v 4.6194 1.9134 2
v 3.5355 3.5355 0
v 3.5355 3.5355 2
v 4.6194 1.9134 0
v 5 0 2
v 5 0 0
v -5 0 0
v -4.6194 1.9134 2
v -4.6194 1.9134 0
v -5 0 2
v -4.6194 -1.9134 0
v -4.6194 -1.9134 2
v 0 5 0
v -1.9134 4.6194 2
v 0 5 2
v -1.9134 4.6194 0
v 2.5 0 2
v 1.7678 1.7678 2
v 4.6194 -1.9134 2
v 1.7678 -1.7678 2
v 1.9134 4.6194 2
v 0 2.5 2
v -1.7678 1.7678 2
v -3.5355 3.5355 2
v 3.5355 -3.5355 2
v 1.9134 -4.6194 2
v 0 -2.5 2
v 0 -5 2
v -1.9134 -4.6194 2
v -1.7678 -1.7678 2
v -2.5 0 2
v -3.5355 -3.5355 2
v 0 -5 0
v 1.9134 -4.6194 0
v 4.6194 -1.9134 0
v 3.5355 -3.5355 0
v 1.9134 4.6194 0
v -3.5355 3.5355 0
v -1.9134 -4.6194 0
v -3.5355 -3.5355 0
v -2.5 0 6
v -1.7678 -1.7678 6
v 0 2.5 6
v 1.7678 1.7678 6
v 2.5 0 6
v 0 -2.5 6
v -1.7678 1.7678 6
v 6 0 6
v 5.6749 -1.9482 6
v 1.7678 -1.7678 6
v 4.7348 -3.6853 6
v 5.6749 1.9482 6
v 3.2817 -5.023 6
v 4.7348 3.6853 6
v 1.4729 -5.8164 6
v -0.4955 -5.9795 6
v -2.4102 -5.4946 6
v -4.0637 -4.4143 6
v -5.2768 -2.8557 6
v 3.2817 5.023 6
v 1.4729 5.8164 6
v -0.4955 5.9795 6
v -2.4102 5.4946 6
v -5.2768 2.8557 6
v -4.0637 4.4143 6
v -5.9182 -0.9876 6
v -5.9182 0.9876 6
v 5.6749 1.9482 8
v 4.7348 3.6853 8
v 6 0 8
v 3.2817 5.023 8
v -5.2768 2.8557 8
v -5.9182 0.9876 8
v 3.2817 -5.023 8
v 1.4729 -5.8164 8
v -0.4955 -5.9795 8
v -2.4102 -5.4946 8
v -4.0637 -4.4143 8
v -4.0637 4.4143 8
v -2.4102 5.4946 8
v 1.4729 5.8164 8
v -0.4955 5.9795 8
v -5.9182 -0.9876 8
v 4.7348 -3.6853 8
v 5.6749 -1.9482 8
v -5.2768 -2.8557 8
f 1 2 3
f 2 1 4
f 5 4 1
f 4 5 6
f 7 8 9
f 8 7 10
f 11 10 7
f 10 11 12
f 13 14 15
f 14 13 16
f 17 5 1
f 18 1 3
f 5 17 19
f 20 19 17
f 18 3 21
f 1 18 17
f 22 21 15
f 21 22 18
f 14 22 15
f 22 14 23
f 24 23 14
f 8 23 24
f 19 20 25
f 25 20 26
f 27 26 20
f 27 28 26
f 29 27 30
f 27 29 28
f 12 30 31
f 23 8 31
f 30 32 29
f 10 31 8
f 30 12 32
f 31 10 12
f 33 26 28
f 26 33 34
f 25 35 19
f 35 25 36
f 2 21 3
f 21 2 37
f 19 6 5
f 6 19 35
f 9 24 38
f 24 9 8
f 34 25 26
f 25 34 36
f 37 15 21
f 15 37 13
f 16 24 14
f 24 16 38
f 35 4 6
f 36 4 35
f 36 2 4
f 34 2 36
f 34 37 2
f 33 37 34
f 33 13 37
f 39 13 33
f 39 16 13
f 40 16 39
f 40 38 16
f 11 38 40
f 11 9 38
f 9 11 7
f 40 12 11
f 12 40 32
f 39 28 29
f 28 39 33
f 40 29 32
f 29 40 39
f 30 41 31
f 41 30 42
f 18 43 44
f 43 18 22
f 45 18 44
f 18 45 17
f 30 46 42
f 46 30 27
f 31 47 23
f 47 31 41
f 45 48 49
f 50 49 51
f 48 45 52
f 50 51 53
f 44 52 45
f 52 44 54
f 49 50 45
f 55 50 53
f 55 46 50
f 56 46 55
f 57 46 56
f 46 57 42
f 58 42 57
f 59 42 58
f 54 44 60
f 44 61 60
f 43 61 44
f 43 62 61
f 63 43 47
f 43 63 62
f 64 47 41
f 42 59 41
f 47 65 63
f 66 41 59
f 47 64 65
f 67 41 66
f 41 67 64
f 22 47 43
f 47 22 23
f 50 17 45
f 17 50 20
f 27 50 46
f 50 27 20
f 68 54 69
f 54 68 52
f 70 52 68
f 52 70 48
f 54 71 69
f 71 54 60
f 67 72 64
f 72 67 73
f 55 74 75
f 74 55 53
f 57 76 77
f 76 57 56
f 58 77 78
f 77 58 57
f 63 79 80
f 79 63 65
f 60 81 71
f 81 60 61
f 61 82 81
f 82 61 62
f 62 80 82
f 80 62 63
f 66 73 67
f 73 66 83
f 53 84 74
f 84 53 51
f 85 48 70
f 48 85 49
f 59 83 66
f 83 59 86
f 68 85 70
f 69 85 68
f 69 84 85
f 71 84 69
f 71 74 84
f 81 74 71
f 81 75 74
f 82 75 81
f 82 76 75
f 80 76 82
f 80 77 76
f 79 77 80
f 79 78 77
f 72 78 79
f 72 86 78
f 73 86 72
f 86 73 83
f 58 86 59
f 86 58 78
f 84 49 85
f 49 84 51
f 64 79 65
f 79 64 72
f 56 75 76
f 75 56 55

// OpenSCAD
//Buttons to hold internal diffuser inside the softbox
translate([0,0,0])cylinder(d=10,h=2);
translate([0,0,2])cylinder(d=5,h=4);
translate([0,0,6])cylinder(d=12,h=2);
